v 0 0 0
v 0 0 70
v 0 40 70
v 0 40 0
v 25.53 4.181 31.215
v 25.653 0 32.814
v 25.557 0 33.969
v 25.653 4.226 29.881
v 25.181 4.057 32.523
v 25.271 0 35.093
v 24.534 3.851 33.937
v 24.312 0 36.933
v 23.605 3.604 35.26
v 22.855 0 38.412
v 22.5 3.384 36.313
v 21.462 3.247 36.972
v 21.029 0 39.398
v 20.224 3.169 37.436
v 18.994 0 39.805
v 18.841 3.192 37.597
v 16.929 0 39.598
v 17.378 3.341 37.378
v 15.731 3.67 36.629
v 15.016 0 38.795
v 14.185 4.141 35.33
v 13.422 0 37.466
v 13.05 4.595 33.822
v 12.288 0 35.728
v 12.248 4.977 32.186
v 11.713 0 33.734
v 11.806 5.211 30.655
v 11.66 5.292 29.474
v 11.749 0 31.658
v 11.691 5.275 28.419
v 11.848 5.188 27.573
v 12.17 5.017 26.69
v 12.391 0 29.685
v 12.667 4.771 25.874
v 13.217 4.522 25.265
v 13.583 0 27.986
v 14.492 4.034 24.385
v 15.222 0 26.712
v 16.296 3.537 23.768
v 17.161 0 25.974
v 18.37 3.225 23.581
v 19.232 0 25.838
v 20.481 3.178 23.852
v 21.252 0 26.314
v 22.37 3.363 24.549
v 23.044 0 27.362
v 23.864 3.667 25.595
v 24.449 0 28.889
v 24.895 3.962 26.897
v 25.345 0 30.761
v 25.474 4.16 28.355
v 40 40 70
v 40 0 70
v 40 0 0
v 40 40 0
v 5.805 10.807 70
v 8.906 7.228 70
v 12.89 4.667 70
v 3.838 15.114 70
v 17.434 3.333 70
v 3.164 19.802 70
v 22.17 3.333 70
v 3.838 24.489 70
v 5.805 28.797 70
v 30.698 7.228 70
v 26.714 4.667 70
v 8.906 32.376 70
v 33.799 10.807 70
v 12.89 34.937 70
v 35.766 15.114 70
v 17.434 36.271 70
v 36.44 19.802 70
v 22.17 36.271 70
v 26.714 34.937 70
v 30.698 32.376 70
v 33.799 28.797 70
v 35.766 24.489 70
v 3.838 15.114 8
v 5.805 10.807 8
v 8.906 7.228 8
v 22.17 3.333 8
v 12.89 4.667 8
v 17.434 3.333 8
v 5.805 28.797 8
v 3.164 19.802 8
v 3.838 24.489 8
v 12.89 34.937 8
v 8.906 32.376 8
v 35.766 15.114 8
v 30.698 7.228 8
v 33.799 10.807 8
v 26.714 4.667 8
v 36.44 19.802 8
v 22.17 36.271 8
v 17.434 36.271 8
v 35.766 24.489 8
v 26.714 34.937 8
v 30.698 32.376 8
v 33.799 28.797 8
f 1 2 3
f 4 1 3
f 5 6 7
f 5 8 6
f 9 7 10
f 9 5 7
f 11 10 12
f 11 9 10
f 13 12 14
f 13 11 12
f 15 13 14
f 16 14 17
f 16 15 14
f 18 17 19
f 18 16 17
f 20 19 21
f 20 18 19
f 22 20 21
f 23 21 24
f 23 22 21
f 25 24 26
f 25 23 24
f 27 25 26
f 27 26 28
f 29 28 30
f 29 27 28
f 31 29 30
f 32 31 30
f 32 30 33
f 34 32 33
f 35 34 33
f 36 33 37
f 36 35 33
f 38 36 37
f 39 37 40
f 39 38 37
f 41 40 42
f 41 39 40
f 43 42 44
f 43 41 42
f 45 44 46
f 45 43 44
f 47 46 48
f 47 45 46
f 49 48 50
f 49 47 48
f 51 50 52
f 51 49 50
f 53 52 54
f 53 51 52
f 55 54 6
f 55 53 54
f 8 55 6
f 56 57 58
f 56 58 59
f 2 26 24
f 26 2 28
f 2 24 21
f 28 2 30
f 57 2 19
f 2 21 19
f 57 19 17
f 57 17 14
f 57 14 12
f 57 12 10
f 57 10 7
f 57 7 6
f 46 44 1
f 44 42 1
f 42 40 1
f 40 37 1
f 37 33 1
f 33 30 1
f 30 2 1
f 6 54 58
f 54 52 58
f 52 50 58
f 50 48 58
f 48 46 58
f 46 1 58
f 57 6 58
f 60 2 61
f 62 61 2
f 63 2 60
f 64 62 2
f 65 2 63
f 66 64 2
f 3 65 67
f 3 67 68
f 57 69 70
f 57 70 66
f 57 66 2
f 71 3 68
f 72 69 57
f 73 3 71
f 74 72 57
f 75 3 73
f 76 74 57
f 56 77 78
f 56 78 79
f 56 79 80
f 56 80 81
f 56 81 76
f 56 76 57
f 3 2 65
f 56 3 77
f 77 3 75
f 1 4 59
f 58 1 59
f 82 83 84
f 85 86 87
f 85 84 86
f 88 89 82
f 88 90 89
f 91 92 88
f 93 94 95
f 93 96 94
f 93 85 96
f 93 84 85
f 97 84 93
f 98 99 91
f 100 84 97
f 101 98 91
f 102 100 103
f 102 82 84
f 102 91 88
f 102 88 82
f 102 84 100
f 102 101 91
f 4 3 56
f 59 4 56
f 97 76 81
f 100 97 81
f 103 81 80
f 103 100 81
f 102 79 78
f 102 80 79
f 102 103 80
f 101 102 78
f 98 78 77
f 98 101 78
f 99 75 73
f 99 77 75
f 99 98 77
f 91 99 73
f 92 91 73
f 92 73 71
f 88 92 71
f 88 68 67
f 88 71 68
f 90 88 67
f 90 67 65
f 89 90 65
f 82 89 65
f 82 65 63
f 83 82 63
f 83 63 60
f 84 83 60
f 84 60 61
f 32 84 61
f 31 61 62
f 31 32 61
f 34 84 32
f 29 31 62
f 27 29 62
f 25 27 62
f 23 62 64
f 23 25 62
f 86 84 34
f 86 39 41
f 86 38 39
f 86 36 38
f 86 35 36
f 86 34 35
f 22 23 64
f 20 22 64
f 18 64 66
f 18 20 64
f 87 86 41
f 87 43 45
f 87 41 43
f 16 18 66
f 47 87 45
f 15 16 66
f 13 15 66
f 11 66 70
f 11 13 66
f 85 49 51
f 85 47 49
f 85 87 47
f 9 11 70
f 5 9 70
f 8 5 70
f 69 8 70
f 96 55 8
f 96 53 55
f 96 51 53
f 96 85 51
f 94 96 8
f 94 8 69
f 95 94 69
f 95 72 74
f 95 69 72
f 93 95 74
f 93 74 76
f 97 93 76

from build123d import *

# Parameters (mm, degrees)
F0_W     = 40
F0_H     = 40
F1_DEPTH = 70
F2_R     = 16.6382118991
F3_DEPTH = 80
F4_W     = 40
F4_H     = 40
F5_DEPTH = 8
F6_R     = 7


with BuildPart() as f1:
    # F0 (on Top) → F1 (new body)
    with BuildSketch(Plane.XY):
        with Locations((20, 20)):
            Rectangle(F0_W, F0_H)
    extrude(amount=F1_DEPTH)

    # F2 (on Top) → F3 (cut)
    with BuildSketch(Plane.XY):
        with Locations((19.8019631207, 19.8019631207)):
            Circle(F2_R)
    extrude(amount=F3_DEPTH, mode=Mode.SUBTRACT)

    # F4 (on Top) → F5 (join)
    with BuildSketch(Plane.XY):
        with Locations((20, 20)):
            Rectangle(F4_W, F4_H)
    extrude(amount=F5_DEPTH)

    # F8: sweep along a path in F7
    with BuildLine(Plane.YZ) as f8_path:
        Line((-5.8375704102, 26.8986206502), (5.3797238506, 19.1151890904))
    # F6 (on Front) → F8 (sweep, cut)
    with BuildSketch(Plane.XZ):
        with Locations((18.6525676399, 32.8138060868)):
            Circle(F6_R)
    sweep(path=f8_path.line, mode=Mode.SUBTRACT)


solid = f1.part
